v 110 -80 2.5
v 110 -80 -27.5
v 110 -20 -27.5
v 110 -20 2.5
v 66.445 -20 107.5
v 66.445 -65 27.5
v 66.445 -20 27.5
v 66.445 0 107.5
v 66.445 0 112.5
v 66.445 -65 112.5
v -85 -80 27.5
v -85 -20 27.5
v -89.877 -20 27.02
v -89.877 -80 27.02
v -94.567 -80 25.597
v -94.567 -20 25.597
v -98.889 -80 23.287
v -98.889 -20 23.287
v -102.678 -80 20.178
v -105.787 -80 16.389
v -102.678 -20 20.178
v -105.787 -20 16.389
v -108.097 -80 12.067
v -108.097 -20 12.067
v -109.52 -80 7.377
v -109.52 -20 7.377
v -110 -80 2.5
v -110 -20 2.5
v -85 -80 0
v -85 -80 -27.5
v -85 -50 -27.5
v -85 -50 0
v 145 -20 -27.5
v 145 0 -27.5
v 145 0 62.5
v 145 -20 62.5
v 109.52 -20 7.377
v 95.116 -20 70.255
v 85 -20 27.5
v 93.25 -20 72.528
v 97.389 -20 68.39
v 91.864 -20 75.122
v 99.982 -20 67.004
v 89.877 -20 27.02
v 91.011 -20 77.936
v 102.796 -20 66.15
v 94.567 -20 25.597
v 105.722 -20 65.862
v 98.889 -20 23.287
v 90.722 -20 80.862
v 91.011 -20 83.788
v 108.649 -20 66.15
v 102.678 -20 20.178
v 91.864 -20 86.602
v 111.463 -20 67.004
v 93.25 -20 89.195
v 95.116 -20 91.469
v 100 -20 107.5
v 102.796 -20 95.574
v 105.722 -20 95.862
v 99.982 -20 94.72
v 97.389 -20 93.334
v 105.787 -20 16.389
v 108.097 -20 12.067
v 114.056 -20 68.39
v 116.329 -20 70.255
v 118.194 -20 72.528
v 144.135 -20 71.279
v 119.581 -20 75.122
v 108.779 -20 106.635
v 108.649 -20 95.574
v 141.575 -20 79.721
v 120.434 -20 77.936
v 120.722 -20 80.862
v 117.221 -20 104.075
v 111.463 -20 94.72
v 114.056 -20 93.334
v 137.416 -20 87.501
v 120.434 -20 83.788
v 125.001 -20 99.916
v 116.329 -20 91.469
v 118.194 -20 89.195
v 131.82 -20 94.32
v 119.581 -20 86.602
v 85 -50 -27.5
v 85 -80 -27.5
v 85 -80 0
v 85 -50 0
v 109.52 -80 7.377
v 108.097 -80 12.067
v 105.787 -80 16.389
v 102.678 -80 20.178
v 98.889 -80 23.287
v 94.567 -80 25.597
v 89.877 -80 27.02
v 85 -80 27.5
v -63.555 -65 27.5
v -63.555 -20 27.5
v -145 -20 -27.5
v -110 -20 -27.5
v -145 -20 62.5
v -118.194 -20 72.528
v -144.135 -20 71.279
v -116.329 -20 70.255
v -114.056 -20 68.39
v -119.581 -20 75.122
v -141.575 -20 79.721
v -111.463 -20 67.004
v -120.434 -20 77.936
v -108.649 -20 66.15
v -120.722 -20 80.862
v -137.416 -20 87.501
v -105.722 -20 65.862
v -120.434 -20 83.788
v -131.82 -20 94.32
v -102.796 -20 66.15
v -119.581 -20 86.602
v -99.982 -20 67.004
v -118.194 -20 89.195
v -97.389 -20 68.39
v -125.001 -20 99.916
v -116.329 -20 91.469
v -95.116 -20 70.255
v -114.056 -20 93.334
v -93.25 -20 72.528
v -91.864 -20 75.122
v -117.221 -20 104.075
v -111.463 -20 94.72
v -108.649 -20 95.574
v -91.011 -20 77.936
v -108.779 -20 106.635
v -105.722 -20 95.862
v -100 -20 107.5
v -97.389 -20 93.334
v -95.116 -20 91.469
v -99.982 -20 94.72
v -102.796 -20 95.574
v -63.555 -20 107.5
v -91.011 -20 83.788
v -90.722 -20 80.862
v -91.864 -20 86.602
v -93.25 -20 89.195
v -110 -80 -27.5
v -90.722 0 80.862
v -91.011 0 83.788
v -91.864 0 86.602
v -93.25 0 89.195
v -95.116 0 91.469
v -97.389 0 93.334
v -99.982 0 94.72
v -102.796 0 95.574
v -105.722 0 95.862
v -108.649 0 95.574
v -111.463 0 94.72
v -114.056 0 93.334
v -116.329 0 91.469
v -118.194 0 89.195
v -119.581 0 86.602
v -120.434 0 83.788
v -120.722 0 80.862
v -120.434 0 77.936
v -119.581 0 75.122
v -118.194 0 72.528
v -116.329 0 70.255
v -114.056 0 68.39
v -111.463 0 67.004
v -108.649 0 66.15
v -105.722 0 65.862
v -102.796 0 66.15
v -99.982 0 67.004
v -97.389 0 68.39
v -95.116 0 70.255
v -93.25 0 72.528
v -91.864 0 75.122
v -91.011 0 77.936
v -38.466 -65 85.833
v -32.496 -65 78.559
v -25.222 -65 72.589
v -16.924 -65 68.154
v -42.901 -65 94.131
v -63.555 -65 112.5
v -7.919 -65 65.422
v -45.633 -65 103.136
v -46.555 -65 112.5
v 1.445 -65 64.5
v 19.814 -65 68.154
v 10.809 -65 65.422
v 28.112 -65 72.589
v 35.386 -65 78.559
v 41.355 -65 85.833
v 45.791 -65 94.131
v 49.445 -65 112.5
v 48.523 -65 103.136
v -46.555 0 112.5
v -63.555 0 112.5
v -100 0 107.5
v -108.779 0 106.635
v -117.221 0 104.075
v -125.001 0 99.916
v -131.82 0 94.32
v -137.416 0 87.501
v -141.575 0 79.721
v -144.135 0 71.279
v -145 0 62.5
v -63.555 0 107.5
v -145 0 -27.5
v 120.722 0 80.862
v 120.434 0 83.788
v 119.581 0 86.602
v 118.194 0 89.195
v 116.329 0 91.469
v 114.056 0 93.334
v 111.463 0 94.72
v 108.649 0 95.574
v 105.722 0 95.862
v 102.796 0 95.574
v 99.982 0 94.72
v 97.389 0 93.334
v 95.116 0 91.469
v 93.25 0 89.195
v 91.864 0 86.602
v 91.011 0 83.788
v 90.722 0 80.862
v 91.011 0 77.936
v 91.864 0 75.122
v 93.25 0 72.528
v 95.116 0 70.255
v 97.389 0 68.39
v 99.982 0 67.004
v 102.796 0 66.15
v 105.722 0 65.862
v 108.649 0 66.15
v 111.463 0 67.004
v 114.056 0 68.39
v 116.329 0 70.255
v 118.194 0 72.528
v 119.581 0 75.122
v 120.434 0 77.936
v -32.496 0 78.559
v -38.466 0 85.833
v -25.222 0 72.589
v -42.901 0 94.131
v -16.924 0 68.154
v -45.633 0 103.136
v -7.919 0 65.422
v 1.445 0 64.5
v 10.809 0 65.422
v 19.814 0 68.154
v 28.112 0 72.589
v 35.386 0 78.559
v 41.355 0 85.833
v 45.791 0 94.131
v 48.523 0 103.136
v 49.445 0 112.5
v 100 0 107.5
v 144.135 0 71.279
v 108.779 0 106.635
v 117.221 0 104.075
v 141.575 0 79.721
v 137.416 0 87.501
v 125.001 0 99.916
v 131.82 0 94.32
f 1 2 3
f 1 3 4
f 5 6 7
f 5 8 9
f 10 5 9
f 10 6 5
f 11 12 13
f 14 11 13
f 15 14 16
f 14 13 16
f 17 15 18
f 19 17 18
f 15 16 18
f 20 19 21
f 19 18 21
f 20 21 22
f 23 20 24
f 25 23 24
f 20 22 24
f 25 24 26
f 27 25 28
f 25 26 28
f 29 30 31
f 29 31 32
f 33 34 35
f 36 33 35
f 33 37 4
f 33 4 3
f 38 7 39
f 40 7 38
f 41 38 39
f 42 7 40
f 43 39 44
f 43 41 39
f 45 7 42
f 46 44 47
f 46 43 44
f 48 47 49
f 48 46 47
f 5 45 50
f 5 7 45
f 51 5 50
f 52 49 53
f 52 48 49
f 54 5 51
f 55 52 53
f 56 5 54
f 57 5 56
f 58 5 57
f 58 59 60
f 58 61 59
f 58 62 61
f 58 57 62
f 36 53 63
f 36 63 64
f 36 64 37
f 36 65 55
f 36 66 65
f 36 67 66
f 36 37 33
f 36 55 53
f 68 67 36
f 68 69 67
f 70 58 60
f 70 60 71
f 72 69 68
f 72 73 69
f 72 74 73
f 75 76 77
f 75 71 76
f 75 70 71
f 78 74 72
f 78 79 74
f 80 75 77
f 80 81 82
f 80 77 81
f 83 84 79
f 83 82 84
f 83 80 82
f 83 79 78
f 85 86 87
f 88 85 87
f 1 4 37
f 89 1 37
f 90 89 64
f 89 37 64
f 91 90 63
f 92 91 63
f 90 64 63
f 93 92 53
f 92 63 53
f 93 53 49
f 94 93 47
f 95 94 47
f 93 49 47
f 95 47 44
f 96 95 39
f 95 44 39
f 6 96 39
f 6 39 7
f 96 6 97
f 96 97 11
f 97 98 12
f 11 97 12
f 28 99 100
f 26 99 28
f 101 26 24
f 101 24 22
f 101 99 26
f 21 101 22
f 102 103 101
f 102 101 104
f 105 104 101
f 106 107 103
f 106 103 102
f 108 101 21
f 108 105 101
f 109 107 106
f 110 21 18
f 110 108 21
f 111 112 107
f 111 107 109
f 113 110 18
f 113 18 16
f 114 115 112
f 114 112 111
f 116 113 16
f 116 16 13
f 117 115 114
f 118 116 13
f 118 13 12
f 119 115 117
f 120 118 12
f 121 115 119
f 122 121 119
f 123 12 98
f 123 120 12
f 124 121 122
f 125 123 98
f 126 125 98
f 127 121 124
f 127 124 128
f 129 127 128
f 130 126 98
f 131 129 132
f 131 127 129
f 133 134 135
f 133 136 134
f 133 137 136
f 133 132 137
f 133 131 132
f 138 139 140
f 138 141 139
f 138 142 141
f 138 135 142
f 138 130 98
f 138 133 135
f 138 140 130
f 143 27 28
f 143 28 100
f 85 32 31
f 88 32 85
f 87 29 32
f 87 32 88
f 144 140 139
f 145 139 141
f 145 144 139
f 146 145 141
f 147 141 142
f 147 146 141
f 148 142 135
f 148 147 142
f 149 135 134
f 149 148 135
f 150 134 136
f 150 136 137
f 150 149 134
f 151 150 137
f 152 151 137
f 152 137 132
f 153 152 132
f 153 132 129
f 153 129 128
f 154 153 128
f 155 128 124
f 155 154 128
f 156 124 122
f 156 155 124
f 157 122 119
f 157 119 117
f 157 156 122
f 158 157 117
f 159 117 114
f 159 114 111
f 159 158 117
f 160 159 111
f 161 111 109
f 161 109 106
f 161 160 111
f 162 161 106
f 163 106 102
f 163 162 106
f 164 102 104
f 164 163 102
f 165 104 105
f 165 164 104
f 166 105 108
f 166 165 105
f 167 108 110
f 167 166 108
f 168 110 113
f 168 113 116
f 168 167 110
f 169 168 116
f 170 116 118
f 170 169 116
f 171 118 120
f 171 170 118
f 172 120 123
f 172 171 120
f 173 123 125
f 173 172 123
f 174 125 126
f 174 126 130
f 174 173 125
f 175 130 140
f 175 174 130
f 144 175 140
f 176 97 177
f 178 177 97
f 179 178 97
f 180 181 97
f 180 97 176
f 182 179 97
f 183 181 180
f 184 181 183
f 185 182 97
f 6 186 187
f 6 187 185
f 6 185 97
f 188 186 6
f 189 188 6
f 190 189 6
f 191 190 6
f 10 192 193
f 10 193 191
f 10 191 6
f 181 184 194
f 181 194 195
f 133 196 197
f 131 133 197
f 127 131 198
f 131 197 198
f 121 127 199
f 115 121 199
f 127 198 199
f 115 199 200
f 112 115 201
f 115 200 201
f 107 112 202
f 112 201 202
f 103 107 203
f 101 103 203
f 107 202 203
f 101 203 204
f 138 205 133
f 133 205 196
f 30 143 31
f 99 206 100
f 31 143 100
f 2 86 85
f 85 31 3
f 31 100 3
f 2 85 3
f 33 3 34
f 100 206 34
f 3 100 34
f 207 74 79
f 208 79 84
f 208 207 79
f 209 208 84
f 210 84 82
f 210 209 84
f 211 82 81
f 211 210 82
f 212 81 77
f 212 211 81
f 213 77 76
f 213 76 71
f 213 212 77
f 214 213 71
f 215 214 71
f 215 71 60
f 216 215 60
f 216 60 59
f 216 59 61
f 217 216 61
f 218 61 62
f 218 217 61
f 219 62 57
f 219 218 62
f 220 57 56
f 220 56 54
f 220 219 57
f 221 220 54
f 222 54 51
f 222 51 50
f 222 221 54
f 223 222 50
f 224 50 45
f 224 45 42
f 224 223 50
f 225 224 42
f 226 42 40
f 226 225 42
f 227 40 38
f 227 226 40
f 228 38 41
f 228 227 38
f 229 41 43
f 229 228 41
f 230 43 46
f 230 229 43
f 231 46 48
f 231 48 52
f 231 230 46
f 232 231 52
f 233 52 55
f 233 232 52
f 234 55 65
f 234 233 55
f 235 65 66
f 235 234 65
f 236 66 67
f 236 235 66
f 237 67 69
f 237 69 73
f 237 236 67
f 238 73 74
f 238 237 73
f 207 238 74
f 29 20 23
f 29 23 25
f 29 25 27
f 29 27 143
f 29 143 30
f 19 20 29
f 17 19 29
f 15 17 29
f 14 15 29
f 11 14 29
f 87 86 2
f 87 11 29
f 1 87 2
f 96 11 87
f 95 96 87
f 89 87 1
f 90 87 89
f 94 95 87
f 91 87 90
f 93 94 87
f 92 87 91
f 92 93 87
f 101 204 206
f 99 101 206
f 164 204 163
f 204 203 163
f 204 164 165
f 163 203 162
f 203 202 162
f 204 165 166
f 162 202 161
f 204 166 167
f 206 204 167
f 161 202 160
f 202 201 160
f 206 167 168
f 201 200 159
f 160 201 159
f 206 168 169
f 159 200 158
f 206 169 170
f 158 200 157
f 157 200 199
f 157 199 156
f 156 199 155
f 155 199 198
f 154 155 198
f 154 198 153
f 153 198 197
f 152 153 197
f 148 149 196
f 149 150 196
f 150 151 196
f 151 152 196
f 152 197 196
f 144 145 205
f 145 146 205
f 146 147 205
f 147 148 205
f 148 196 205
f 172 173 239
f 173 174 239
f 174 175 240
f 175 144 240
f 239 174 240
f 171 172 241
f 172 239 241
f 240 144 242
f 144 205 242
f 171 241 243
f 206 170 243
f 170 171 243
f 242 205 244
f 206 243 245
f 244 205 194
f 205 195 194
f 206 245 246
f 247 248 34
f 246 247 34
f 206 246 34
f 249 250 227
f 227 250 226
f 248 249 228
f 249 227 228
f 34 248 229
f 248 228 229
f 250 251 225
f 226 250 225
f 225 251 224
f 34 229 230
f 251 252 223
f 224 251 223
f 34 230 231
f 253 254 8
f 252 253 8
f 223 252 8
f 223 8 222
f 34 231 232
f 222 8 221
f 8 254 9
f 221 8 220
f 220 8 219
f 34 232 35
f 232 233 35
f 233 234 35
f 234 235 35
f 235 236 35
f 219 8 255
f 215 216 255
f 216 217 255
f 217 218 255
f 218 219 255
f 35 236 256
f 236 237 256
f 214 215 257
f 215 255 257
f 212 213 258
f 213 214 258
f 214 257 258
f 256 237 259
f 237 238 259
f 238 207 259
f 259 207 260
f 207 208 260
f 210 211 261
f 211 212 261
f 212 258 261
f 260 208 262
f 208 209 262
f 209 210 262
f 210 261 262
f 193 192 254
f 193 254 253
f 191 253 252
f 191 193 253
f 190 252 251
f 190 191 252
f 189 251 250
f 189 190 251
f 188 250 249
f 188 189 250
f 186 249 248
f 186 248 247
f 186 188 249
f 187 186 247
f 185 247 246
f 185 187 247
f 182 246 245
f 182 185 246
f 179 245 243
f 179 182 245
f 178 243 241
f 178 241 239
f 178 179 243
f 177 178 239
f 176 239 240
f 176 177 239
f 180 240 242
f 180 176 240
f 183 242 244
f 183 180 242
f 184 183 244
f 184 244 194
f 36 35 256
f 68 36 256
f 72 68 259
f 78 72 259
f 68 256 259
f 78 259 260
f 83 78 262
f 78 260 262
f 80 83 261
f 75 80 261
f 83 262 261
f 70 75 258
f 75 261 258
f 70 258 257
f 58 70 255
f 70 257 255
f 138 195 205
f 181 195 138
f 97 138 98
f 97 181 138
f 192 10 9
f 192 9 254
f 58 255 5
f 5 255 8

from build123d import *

# Parameters (mm, degrees)
F1_DEPTH = 80
F2_W     = 170
F2_H     = 27.5
F3_DEPTH = 30
F6_DEPTH = 65
F8_R     = 15
F9_DEPTH = 20


with BuildPart() as f1:
    # F0 (on Front) → F1 (new body)
    with BuildSketch(Plane.XZ):
        with BuildLine():
            ThreePointArc((110, 2.5), (102.6776695297, 20.1776695297), (85, 27.5))
            Line((85, 27.5), (-85, 27.5))
            ThreePointArc((-85, 27.5), (-102.6776695297, 20.1776695297), (-110, 2.5))
            Line((-110, 2.5), (-110, -27.5))
            Line((-110, -27.5), (110, -27.5))
            Line((110, -27.5), (110, 2.5))
        make_face()
    extrude(amount=F1_DEPTH)

    # F2 (on face) → F3 (cut)
    with BuildSketch(Plane.XZ.offset(80)):
        with Locations((0, -13.75)):
            Rectangle(F2_W, F2_H)
    extrude(amount=-F3_DEPTH, mode=Mode.SUBTRACT)

    # F5 (on offset) → F6 (join)
    with BuildSketch(Plane.XZ.offset(65)):
        with BuildLine():
            Line((-46.5551204979, 112.5), (-63.5551204979, 112.5))
            Line((-63.5551204979, 112.5), (-63.5551204979, 27.5))
            Line((-63.5551204979, 27.5), (66.4448795021, 27.5))
            Line((66.4448795021, 27.5), (66.4448795021, 112.5))
            Line((66.4448795021, 112.5), (49.4448795021, 112.5))
            ThreePointArc((49.4448795021, 112.5), (1.4448795021, 64.5), (-46.5551204979, 112.5))
        make_face()
    extrude(amount=-F6_DEPTH)

    # F8 (on offset) → F9 (join)
    with BuildSketch(Plane.XZ):
        with BuildLine():
            Line((100, 107.5), (66.4448795021, 107.5))
            Line((66.4448795021, 107.5), (66.4448795021, 27.5))
            Line((66.4448795021, 27.5), (85, 27.5))
            ThreePointArc((85, 27.5), (102.6776695297, 20.1776695297), (110, 2.5))
            Line((110, 2.5), (110, -27.5))
            Line((110, -27.5), (145, -27.5))
            Line((145, -27.5), (145, 62.5))
            ThreePointArc((145, 62.5), (131.8198051534, 94.3198051534), (100, 107.5))
        make_face()
        with Locations((105.722439751, 80.8619317412)):
            Circle(F8_R, mode=Mode.SUBTRACT)
        with BuildLine():
            ThreePointArc((-100, 107.5), (-131.8198051534, 94.3198051534), (-145, 62.5))
            Line((-145, 62.5), (-145, -27.5))
            Line((-145, -27.5), (-110, -27.5))
            Line((-110, -27.5), (-110, 2.5))
            ThreePointArc((-110, 2.5), (-102.6776695297, 20.1776695297), (-85, 27.5))
            Line((-85, 27.5), (-63.5551204979, 27.5))
            Line((-63.5551204979, 27.5), (-63.5551204979, 107.5))
            Line((-63.5551204979, 107.5), (-100, 107.5))
        make_face()
        with Locations((-105.722439751, 80.8619317412)):
            Circle(F8_R, mode=Mode.SUBTRACT)
    extrude(amount=F9_DEPTH)


solid = f1.part
